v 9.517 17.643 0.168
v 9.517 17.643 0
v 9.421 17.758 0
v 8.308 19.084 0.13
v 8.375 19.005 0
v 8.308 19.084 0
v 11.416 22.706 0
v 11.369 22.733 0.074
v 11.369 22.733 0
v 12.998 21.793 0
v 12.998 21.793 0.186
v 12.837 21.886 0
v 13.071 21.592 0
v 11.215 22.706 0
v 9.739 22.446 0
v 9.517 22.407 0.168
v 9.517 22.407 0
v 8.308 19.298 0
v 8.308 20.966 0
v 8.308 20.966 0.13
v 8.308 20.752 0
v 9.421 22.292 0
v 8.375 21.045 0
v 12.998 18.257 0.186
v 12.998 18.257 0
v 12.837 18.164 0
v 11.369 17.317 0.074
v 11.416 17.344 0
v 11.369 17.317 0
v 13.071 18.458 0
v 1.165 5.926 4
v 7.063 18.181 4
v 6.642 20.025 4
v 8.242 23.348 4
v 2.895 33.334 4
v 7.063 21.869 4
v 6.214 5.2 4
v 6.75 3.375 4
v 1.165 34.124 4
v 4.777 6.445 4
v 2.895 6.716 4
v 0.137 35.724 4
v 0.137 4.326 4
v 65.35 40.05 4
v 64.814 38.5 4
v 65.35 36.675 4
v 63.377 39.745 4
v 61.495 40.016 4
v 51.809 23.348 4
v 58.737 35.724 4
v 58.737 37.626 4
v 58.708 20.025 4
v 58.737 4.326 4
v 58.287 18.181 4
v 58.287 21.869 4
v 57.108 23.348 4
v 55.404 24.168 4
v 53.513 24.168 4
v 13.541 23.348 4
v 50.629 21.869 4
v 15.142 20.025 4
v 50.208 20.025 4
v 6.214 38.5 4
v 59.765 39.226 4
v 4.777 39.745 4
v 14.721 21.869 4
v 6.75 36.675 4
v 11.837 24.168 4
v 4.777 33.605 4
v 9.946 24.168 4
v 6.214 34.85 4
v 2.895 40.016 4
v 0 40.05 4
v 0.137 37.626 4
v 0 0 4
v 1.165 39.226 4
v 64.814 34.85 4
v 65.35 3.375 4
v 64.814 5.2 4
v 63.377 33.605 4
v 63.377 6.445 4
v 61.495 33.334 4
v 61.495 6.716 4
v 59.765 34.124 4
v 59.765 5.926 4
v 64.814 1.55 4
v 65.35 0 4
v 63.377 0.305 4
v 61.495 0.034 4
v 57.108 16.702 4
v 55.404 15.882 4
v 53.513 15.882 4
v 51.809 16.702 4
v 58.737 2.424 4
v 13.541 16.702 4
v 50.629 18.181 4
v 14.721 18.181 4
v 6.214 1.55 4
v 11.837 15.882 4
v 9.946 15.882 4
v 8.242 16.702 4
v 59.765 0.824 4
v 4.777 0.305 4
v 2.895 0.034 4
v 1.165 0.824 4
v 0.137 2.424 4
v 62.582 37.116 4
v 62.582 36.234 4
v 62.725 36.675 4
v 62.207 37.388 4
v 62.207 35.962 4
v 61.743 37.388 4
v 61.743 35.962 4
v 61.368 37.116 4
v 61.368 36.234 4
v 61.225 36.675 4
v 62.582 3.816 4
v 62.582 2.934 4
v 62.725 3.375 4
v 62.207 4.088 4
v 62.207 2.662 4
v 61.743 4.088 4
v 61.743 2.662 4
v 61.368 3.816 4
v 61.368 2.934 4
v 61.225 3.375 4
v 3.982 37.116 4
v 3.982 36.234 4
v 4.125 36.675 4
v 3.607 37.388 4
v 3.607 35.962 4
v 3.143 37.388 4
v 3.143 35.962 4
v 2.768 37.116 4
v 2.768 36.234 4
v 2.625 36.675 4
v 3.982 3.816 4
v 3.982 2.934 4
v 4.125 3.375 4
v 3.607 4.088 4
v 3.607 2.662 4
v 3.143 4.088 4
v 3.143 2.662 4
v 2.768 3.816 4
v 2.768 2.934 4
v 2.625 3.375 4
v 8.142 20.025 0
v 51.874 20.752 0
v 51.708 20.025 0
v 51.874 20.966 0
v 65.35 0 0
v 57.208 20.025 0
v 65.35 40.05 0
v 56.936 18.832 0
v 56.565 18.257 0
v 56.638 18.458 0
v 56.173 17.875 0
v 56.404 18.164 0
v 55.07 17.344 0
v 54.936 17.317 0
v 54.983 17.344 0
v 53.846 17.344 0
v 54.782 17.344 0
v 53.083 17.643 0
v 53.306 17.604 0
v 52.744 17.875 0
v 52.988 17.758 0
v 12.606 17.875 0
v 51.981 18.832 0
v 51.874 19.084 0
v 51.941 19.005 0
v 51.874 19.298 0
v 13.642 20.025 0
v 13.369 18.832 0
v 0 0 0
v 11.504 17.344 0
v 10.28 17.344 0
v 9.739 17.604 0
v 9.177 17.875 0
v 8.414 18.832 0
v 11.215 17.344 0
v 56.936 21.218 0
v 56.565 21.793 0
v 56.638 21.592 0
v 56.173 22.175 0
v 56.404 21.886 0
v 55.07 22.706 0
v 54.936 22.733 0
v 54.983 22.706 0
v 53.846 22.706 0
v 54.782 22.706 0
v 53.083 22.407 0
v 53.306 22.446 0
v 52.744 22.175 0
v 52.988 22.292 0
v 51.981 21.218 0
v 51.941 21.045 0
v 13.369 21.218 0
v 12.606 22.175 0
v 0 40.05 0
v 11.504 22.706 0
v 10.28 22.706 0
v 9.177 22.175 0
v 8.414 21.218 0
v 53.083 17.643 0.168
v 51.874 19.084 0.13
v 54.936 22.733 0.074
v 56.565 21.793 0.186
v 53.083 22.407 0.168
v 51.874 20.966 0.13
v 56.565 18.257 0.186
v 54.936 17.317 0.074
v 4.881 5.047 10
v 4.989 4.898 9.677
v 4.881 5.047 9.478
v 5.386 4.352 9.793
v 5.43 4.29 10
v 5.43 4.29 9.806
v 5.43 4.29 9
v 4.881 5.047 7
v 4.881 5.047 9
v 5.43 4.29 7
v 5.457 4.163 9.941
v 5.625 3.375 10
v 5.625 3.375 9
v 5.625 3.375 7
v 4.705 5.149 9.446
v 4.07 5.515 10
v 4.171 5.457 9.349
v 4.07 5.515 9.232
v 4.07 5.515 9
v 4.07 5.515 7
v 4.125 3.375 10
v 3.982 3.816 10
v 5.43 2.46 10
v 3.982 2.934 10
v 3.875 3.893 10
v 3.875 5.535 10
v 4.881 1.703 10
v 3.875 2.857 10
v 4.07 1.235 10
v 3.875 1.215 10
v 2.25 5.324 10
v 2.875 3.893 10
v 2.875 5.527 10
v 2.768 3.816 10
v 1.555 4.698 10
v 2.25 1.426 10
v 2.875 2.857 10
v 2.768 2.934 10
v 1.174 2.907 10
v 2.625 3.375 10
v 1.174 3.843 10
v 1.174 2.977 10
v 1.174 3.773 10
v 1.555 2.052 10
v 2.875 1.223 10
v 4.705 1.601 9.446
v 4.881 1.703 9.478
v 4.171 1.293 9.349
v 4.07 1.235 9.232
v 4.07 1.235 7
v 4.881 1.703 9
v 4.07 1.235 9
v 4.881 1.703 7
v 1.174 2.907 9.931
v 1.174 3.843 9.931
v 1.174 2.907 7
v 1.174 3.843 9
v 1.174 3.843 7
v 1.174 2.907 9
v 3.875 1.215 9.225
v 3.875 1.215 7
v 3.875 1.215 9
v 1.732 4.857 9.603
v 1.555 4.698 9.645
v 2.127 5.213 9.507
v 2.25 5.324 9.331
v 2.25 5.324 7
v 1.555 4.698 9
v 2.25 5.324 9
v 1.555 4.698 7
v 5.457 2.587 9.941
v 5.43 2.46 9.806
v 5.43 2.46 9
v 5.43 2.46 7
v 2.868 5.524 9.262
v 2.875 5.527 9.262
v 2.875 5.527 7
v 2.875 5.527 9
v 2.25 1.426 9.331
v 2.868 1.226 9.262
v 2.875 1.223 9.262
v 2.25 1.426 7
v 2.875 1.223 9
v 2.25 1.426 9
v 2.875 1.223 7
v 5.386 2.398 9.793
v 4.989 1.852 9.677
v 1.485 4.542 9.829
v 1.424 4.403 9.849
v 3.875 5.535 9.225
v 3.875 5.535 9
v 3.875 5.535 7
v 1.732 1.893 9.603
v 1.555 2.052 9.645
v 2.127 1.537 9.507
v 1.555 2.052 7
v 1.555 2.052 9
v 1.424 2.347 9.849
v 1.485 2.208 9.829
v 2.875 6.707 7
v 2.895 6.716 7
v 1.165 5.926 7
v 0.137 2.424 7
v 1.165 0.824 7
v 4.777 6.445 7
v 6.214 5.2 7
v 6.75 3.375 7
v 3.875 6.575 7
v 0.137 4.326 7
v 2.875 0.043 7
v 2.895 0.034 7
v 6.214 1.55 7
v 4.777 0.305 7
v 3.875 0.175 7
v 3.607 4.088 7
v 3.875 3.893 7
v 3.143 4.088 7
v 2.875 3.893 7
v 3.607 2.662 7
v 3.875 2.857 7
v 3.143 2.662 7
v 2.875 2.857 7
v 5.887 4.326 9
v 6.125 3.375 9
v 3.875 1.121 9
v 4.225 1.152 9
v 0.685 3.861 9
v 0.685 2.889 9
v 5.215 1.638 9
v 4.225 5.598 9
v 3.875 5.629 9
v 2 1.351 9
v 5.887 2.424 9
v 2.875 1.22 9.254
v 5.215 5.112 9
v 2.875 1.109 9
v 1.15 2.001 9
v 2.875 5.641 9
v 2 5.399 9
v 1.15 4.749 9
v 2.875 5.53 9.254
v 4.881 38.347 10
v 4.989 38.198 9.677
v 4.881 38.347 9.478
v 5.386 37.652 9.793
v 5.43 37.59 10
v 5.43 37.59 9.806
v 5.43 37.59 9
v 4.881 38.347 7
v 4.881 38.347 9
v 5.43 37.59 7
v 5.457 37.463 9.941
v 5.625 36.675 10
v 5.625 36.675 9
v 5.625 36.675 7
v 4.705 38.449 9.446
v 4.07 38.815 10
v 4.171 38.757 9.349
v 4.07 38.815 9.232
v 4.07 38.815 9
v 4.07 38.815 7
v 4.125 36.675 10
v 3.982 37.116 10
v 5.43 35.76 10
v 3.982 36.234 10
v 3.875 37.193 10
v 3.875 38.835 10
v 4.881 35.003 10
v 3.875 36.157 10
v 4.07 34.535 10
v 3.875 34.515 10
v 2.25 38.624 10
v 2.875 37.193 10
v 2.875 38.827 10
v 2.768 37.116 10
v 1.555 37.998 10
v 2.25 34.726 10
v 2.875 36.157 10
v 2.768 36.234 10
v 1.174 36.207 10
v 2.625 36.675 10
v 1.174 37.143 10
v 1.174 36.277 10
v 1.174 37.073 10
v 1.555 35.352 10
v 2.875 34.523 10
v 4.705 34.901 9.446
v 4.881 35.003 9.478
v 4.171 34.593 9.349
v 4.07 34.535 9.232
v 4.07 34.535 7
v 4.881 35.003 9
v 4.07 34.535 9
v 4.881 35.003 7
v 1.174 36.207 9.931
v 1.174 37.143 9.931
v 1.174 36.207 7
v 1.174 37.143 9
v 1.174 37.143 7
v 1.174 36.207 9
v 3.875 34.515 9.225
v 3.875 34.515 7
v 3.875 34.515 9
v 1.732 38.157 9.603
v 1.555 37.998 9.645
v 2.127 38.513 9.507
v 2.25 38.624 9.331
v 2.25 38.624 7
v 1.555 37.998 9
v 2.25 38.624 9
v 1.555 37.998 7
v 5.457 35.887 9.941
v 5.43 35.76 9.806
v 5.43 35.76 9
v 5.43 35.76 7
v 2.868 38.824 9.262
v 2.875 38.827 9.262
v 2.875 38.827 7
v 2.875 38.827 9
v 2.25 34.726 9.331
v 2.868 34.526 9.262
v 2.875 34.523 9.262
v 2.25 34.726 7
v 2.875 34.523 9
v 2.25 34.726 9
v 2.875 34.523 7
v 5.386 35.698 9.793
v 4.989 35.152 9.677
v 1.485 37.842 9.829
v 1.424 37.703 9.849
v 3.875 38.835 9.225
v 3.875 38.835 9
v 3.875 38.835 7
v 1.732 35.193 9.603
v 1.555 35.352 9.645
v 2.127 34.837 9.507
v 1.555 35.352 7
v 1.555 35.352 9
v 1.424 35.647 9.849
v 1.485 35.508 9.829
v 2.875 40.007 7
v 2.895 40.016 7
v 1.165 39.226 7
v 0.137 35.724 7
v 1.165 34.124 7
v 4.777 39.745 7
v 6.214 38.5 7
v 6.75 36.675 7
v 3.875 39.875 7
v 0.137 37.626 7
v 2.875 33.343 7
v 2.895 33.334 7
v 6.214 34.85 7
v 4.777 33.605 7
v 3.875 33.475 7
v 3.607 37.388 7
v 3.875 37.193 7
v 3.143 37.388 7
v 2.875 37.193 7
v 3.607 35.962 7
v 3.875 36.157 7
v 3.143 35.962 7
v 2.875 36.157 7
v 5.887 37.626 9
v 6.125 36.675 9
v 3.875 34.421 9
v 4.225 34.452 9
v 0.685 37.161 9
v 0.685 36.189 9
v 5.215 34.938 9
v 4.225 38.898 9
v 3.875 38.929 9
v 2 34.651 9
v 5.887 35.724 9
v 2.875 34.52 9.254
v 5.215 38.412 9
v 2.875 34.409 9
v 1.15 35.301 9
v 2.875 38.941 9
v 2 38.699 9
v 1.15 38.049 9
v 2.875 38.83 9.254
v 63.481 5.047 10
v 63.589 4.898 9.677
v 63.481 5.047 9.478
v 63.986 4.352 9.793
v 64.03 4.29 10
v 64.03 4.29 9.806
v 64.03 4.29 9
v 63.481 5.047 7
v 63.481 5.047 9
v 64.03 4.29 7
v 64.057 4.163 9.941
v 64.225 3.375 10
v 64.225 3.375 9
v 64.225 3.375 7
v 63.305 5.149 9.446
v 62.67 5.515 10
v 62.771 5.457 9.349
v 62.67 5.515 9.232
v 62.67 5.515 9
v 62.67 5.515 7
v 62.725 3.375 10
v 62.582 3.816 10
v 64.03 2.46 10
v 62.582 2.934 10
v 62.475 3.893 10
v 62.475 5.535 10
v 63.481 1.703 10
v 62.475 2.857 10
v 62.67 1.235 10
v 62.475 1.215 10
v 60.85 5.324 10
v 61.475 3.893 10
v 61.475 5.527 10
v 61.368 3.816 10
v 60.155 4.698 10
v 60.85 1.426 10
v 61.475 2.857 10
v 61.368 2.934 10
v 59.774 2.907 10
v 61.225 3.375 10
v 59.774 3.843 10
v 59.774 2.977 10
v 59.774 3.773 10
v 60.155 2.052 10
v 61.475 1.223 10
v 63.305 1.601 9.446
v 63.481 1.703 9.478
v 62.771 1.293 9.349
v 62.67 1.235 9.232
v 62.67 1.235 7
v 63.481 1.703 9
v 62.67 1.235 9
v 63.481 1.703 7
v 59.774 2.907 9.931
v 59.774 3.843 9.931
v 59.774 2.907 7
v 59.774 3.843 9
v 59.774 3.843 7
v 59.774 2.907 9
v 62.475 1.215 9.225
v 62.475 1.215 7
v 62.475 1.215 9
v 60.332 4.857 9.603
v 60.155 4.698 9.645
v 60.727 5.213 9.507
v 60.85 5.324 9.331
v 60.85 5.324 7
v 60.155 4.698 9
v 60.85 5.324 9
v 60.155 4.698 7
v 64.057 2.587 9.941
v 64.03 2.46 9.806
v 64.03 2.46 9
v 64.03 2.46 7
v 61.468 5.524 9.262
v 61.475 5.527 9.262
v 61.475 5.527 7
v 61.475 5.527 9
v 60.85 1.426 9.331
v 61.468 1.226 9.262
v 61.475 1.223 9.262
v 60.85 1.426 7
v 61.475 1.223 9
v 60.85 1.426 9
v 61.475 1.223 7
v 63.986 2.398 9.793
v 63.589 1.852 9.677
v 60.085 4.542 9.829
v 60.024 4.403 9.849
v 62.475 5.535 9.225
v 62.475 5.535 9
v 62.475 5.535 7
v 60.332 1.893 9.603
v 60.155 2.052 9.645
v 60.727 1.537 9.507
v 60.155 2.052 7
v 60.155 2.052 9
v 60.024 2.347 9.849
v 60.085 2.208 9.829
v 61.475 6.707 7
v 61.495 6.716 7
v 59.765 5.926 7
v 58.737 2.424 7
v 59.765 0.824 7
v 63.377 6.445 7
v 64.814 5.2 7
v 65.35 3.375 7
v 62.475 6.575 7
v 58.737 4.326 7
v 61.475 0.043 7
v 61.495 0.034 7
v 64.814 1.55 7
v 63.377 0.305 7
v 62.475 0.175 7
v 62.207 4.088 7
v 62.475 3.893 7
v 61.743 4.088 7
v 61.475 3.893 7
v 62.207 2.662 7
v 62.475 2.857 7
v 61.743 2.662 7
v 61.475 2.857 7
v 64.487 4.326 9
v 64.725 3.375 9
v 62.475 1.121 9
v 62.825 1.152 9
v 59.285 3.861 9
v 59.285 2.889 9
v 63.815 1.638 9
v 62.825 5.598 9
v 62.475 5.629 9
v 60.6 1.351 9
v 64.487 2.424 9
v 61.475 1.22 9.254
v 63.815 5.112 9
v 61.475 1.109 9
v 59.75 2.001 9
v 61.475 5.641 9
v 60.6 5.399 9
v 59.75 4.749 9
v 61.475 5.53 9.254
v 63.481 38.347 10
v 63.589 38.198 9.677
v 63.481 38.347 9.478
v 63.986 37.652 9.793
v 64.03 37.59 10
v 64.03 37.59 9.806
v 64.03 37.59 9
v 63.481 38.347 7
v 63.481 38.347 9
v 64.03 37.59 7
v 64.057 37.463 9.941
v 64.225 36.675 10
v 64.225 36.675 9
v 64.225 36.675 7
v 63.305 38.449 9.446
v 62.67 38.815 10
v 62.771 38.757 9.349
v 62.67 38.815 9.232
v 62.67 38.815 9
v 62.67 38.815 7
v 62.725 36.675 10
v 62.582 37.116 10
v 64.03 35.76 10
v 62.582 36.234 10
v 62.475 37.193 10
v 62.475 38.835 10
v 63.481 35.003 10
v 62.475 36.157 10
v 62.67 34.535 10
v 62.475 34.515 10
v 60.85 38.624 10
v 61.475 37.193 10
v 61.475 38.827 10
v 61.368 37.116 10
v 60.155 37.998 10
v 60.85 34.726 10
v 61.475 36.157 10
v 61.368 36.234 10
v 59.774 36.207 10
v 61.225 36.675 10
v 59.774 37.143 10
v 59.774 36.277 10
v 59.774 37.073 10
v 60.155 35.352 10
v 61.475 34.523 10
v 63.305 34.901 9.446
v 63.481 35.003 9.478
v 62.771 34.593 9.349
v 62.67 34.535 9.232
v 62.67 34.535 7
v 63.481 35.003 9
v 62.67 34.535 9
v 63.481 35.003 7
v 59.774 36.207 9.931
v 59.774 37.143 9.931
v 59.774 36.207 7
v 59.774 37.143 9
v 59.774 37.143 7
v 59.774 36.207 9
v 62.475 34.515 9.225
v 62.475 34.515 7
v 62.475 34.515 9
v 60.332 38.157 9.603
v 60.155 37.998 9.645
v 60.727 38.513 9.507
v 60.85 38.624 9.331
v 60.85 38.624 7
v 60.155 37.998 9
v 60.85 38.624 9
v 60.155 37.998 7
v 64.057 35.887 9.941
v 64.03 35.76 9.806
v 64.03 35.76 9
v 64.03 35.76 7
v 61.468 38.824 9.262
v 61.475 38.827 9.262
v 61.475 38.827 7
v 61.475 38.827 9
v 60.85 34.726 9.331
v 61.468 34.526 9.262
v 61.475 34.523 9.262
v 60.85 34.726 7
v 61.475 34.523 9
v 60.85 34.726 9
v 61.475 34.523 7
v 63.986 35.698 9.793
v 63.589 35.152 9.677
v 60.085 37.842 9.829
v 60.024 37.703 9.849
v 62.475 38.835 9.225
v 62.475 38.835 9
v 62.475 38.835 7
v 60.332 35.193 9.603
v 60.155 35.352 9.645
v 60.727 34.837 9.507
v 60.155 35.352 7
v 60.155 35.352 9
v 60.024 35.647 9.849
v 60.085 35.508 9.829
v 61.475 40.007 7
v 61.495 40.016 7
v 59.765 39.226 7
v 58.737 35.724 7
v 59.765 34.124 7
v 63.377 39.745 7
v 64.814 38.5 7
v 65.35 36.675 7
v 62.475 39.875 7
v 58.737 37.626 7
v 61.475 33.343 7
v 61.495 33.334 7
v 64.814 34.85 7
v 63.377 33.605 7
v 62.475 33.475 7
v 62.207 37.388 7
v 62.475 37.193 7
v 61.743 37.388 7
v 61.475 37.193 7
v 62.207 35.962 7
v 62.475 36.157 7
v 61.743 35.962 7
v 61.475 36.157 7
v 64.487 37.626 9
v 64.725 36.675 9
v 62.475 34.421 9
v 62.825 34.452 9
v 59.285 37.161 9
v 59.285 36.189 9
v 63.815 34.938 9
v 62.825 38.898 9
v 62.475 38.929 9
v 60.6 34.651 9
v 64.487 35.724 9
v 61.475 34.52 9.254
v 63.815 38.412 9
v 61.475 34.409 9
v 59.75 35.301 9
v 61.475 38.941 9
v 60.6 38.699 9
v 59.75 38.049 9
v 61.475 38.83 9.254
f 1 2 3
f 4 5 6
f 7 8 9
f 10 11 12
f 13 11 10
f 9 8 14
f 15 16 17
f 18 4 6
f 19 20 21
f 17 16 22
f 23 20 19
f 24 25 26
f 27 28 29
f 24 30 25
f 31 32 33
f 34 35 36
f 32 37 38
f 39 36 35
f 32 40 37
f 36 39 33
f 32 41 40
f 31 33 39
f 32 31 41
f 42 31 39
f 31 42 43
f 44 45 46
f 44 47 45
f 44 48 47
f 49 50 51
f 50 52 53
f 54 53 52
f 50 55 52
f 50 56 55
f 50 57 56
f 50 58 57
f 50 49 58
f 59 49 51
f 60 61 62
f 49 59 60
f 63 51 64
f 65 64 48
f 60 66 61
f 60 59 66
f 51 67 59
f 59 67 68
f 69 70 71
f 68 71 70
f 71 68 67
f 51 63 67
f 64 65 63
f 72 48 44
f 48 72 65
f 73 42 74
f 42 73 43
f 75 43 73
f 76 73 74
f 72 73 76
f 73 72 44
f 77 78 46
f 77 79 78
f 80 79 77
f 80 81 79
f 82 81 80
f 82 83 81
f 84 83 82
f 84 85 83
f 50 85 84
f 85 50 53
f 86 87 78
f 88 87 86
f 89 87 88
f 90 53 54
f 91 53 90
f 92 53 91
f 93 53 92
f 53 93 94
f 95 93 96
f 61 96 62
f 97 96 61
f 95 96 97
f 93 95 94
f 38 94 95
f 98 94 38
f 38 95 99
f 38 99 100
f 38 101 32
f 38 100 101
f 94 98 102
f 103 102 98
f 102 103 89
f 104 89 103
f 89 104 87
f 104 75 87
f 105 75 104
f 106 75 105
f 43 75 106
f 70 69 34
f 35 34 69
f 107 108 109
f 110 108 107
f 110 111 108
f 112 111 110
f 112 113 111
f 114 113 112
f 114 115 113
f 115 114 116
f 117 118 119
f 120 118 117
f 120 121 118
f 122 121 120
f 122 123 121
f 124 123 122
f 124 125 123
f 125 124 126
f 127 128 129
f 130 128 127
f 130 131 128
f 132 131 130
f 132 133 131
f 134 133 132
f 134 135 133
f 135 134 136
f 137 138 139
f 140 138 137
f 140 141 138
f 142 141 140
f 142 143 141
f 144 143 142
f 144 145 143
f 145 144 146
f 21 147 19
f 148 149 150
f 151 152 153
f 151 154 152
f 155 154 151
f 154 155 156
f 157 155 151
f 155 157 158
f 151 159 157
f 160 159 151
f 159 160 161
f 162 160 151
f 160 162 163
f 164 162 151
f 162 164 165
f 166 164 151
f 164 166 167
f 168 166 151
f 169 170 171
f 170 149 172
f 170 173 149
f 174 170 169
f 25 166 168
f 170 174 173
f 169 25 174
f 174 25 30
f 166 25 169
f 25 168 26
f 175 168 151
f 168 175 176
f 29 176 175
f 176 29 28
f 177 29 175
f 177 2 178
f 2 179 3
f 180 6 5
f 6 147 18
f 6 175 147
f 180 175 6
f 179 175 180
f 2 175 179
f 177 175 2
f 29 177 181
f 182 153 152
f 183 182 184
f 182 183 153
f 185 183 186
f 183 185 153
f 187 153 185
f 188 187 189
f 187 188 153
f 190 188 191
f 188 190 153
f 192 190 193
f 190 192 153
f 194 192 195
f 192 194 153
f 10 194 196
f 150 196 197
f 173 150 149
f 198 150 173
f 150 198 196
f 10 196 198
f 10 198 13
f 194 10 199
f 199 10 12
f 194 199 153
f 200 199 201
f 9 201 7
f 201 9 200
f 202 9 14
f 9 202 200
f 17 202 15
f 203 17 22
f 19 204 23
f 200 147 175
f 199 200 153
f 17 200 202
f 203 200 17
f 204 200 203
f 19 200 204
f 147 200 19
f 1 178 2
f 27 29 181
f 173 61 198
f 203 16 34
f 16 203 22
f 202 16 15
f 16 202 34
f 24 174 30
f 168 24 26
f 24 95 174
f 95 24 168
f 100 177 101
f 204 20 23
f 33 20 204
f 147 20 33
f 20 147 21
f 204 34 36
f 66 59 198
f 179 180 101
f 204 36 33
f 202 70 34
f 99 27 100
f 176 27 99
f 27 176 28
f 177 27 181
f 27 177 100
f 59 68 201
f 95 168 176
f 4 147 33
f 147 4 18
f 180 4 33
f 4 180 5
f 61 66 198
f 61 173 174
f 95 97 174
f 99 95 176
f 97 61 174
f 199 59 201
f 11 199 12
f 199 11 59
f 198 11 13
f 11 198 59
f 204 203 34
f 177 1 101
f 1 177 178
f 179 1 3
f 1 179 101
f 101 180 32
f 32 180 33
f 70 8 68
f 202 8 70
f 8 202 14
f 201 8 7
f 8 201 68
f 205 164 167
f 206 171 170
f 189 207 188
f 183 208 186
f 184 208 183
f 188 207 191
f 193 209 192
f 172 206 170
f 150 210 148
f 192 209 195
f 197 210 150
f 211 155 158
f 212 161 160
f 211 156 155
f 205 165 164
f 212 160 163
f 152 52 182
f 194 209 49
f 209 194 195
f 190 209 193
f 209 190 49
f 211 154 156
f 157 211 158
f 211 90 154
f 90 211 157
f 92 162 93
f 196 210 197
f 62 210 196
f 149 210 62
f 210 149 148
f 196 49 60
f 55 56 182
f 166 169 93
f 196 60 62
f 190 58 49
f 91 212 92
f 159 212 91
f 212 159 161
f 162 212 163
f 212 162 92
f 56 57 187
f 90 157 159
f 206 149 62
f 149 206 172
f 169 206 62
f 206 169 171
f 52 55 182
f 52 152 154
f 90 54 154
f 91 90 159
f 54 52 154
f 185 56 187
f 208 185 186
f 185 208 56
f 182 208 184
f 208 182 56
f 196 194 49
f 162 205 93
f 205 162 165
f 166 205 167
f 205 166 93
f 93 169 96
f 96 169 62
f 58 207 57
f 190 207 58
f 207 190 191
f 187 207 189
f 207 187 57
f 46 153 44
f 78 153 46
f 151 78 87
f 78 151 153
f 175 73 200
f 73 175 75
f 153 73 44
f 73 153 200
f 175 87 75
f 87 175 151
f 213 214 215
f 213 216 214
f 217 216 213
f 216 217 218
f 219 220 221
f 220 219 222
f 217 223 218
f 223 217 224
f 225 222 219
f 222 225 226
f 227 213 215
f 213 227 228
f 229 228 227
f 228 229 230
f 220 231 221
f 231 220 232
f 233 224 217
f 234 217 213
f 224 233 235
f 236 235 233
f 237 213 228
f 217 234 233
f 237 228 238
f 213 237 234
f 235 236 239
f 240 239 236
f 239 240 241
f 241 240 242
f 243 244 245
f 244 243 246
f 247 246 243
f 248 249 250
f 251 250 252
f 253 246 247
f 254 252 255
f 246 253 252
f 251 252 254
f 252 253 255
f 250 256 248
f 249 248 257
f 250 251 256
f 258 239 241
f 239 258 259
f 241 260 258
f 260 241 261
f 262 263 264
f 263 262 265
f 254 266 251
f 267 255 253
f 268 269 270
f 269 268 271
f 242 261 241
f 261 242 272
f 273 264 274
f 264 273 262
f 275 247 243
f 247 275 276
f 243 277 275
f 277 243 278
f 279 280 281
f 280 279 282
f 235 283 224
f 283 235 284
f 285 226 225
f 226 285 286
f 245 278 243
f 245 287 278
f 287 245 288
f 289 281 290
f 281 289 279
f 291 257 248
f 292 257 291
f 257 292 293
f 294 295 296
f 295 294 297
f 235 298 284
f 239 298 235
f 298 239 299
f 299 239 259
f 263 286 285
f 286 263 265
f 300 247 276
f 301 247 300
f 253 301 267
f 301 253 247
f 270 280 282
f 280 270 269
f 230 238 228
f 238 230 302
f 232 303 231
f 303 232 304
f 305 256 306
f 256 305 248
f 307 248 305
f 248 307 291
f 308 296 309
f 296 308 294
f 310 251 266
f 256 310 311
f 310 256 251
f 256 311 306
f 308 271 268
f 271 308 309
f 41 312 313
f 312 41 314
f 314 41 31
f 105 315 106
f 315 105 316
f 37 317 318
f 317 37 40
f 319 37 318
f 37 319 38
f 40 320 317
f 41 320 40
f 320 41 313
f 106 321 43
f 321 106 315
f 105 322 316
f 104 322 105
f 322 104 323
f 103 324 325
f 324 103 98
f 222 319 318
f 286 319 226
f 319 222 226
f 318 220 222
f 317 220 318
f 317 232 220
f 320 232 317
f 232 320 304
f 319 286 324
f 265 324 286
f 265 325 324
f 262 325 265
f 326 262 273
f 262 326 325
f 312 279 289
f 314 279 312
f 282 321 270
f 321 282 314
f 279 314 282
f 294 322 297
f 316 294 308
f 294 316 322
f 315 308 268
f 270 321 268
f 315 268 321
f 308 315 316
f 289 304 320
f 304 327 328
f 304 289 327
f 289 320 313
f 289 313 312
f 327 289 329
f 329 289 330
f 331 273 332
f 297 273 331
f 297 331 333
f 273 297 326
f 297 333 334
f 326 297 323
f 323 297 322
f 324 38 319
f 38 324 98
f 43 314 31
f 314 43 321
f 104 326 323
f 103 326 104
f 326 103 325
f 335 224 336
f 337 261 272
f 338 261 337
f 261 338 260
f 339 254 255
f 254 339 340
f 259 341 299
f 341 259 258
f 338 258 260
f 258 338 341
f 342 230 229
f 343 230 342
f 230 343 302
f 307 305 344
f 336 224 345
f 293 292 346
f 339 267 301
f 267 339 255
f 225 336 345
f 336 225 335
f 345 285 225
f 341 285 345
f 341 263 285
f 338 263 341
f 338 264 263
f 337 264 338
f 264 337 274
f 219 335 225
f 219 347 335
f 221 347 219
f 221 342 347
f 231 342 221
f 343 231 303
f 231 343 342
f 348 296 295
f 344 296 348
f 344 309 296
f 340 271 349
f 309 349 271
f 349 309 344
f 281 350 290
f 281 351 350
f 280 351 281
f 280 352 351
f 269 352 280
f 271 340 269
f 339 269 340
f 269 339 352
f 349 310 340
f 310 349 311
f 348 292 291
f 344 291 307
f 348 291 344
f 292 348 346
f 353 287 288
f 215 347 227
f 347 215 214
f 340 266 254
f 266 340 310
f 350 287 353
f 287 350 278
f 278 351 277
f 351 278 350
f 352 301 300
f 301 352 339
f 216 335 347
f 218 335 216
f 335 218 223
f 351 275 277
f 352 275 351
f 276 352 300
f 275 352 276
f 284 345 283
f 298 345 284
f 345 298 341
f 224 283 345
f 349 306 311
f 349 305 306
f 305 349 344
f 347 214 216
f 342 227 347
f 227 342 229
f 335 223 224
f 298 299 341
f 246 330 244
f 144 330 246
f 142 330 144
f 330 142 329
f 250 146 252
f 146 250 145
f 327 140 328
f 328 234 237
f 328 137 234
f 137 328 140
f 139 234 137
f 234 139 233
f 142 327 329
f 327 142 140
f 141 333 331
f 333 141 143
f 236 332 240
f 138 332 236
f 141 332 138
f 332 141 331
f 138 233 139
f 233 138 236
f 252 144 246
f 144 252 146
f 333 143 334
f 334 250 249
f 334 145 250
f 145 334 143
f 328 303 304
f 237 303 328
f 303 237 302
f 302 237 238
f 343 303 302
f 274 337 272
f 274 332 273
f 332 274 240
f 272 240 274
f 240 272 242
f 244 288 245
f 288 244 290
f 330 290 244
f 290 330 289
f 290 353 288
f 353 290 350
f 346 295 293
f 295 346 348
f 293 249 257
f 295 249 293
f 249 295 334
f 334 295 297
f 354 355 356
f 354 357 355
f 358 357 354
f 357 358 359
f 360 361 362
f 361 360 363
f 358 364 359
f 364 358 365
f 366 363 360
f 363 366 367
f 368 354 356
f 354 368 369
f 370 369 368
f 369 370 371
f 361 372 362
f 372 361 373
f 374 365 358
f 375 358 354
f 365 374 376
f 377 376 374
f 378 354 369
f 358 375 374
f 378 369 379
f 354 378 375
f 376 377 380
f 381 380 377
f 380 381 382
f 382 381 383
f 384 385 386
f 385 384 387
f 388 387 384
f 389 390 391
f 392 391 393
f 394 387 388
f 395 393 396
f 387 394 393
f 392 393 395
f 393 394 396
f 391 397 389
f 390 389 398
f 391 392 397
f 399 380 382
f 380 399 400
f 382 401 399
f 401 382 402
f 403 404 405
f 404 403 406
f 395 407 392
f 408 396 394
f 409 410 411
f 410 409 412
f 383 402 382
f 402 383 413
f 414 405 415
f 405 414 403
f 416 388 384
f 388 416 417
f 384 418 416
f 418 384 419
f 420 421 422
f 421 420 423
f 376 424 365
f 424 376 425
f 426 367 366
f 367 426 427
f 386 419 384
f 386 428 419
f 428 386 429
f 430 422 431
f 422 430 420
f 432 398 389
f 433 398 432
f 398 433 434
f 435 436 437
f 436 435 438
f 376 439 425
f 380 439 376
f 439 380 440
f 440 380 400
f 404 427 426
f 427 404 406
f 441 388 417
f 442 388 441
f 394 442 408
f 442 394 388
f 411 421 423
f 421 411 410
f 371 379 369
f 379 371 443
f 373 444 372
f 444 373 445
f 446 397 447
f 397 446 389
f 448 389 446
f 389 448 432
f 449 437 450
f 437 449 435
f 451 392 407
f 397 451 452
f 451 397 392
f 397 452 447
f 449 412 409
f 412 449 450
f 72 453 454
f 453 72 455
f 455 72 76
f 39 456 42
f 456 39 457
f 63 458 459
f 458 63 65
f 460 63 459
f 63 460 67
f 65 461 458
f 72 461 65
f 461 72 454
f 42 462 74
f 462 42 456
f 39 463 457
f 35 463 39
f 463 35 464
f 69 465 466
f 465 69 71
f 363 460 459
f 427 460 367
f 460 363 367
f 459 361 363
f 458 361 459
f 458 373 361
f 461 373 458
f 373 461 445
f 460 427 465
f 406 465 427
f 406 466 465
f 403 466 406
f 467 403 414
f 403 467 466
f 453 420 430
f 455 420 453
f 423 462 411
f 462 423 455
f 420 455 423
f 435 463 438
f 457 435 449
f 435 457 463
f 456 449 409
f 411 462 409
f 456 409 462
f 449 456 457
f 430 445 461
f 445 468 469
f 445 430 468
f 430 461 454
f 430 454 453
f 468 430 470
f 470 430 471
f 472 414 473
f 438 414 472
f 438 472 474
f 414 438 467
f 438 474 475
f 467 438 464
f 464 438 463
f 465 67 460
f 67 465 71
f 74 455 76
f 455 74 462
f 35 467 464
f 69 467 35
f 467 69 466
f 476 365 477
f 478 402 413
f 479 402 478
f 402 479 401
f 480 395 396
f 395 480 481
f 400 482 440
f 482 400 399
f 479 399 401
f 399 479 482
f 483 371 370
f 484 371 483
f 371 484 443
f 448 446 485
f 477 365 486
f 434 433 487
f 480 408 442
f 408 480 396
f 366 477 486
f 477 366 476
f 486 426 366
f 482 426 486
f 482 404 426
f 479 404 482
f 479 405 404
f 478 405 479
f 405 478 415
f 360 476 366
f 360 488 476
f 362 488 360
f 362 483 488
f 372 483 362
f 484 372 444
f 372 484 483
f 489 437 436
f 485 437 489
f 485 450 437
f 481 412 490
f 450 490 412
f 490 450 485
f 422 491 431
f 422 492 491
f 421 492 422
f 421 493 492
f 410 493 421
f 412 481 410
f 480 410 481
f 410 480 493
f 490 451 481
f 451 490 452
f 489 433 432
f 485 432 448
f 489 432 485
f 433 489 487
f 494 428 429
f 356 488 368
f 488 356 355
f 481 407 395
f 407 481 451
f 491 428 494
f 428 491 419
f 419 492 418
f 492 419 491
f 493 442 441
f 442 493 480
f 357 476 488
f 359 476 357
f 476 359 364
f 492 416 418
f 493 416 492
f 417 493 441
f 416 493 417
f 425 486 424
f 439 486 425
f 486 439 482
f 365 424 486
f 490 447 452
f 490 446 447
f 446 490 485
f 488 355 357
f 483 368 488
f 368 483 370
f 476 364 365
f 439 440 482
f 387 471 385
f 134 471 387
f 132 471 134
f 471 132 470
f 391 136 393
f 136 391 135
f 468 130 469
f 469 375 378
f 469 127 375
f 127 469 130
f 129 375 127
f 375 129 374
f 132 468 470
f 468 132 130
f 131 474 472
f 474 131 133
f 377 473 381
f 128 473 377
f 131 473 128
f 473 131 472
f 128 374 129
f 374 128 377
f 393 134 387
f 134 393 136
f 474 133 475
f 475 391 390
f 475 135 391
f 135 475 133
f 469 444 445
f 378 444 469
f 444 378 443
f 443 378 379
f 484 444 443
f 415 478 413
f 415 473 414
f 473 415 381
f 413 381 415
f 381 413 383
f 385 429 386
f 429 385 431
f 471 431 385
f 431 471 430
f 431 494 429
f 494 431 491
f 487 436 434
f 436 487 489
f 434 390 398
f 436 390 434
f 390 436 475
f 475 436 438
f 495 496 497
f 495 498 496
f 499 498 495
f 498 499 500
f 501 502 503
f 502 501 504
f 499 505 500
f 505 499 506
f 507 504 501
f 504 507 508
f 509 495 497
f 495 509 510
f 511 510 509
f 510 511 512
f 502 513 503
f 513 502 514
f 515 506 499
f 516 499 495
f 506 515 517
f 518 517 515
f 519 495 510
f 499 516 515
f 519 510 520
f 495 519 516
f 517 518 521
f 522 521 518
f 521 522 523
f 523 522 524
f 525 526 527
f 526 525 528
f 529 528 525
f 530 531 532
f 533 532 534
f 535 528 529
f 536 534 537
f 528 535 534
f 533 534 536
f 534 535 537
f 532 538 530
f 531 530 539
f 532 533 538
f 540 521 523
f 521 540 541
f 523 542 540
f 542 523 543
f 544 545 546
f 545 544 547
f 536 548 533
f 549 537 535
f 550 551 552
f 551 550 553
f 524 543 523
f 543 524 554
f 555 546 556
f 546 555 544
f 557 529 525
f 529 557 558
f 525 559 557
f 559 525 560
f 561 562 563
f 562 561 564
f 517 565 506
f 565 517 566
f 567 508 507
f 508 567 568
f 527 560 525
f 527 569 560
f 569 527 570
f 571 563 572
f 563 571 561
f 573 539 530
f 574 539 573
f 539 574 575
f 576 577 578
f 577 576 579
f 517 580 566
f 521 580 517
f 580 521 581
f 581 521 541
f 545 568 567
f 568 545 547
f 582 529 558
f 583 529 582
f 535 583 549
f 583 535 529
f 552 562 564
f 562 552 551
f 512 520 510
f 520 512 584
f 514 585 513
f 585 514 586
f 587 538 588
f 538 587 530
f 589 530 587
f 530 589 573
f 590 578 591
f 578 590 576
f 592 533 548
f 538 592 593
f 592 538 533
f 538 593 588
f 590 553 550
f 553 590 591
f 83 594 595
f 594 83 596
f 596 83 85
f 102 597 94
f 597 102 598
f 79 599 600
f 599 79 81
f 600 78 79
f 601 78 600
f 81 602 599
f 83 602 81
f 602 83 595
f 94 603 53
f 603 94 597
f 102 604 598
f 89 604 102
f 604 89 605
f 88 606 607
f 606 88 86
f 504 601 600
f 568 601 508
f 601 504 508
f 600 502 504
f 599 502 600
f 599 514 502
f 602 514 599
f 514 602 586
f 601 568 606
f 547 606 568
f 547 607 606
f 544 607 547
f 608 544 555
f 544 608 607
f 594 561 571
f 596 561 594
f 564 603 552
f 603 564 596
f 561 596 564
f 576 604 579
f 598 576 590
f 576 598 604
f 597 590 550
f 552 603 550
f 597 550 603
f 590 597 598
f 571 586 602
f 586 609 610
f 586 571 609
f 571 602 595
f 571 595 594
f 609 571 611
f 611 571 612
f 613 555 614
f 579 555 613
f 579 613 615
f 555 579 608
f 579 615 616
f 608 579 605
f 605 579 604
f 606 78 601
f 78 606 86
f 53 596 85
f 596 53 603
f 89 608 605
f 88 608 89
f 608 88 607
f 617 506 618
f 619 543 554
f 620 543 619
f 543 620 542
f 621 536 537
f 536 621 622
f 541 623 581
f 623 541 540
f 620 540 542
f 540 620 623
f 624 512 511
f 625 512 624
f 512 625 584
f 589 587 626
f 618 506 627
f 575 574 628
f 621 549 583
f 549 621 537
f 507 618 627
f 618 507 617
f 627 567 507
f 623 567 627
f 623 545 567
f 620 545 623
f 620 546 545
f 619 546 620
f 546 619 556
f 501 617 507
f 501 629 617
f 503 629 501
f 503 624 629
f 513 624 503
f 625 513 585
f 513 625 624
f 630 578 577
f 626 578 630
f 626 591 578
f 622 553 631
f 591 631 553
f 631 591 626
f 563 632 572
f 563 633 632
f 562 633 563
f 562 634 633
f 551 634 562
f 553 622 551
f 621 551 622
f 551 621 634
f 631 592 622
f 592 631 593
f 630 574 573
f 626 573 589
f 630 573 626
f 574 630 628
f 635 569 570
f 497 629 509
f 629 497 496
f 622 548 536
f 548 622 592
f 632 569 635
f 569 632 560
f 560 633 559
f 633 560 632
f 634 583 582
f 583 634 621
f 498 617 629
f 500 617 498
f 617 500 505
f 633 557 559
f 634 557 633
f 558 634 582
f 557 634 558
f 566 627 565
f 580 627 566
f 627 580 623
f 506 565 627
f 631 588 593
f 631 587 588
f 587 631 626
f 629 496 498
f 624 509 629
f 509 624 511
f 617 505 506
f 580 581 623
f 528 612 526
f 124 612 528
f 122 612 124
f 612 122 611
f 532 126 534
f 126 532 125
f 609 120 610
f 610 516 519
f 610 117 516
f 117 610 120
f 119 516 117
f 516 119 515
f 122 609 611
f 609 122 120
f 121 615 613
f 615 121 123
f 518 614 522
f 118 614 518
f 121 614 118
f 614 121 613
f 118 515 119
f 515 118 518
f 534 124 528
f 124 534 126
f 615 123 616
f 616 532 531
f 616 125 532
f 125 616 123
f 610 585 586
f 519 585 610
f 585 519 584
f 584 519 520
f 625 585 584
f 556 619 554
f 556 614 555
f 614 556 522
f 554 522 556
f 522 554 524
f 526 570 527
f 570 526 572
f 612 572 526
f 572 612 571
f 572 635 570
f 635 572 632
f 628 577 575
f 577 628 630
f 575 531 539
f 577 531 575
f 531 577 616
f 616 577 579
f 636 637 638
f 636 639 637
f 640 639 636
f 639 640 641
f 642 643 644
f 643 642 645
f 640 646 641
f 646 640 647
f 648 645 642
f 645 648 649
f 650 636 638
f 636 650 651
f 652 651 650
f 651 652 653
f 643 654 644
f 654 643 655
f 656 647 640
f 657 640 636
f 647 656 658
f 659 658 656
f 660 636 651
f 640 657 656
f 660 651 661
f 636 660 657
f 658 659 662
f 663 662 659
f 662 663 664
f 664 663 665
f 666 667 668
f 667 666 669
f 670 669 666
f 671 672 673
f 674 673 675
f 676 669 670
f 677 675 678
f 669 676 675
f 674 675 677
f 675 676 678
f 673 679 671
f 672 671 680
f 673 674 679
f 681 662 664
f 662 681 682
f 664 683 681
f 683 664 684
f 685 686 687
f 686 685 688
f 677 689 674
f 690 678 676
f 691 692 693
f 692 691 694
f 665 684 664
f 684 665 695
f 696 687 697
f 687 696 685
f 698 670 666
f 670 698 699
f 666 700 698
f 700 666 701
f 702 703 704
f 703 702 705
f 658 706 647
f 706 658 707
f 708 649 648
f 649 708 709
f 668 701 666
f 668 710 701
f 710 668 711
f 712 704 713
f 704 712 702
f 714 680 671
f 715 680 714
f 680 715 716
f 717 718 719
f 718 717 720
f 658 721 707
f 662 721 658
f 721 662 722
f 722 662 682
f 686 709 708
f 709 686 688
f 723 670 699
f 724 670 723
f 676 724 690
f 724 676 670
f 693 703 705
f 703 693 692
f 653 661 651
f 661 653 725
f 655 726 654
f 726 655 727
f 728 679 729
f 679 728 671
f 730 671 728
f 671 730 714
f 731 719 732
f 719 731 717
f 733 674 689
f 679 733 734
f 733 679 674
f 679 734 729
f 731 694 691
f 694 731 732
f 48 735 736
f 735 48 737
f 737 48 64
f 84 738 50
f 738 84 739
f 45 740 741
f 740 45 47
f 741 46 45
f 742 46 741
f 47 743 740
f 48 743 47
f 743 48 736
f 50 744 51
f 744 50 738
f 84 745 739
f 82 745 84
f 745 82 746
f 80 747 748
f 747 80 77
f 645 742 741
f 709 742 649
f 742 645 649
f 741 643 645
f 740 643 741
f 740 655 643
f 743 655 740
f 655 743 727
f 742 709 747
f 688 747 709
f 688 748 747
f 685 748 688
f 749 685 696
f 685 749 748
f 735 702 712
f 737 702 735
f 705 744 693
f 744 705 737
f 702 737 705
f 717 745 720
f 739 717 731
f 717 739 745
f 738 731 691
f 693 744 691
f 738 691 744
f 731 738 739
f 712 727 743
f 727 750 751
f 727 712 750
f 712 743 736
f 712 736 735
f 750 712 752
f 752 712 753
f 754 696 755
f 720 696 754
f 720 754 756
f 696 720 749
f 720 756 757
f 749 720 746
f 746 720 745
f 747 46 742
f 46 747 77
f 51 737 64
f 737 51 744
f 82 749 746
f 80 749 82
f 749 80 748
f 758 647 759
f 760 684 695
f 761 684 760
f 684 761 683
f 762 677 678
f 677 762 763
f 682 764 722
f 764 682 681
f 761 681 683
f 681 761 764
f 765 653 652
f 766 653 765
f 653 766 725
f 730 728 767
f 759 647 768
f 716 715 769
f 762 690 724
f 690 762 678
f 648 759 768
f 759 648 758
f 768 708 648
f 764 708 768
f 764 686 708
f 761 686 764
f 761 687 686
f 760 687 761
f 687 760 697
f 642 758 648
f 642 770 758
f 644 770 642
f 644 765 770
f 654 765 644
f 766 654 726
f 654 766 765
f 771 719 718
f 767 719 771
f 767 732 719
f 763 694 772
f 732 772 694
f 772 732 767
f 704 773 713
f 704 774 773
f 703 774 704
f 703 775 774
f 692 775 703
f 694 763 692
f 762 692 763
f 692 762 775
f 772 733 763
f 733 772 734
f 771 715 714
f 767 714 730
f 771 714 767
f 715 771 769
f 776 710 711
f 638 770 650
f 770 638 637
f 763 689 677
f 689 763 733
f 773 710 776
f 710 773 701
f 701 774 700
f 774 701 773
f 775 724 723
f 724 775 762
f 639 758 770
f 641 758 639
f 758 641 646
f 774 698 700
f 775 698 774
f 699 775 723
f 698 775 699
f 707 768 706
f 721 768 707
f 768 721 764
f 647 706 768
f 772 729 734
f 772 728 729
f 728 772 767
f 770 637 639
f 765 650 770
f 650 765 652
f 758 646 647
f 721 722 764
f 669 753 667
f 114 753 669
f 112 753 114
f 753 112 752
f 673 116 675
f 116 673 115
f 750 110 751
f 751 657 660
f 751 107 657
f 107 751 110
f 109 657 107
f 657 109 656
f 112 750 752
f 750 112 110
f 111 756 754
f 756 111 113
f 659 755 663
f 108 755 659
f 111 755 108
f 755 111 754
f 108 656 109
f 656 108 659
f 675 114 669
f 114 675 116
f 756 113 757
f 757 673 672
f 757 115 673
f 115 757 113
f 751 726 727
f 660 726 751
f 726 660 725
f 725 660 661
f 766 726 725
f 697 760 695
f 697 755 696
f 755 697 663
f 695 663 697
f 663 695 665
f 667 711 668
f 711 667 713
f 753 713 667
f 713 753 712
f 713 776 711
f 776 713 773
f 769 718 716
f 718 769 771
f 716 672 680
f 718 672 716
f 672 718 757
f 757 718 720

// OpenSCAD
platform_h=4;
screw_d=5.5;
screw_head_h=4;
screw_head_d=8.5;
leg_hole_d=4.5;
leg_spacer=3;
mount_distance=[58.6, 33.3];
platform=[
    mount_distance[0]+leg_hole_d*1.5,
    mount_distance[1]+leg_hole_d*1.5,
    4
    ];

difference() {
    // Platform
    cube(platform);
    //screw holes
    for (i=[-1,2,1]) {
        translate([platform[0]/2+i*platform[0]/3, platform[1]/2, 0]) screw();
    }
}
// mount leg
for (i=[0,1,1]) { 
    for (j=[0,1,1]) {
        translate([i*mount_distance[0]+leg_hole_d*1.5/2,j*mount_distance[1]+leg_hole_d*1.5/2,platform_h]) leg();
    }
}


module screw() {
    cylinder(d=screw_d, h=platform[2]);
    translate([0,0,platform[2]-screw_head_h]) cylinder(d1=screw_d, d2=screw_head_d, h=screw_head_h);
}

module leg() {
    board_h=2;
    lock_h=1;
    difference() {
        union() {
            cylinder(d=leg_hole_d, h=leg_spacer+board_h+lock_h, $fn=15);
            cylinder(d=leg_hole_d*1.5, h=leg_spacer);
            // mount lock skirt
            translate([0,0,leg_spacer+board_h]) scale([1,0.85,1]) cylinder(d1=leg_hole_d+1, d2=leg_hole_d, h=lock_h, $fn=15);
        }
        // screw cutout
        cylinder(d=1.5, h=leg_spacer+board_h+lock_h, $fn=10);
        #translate([-0.5,-leg_hole_d,leg_spacer]) cube([1, leg_hole_d*2, board_h+lock_h]);
    }
}
